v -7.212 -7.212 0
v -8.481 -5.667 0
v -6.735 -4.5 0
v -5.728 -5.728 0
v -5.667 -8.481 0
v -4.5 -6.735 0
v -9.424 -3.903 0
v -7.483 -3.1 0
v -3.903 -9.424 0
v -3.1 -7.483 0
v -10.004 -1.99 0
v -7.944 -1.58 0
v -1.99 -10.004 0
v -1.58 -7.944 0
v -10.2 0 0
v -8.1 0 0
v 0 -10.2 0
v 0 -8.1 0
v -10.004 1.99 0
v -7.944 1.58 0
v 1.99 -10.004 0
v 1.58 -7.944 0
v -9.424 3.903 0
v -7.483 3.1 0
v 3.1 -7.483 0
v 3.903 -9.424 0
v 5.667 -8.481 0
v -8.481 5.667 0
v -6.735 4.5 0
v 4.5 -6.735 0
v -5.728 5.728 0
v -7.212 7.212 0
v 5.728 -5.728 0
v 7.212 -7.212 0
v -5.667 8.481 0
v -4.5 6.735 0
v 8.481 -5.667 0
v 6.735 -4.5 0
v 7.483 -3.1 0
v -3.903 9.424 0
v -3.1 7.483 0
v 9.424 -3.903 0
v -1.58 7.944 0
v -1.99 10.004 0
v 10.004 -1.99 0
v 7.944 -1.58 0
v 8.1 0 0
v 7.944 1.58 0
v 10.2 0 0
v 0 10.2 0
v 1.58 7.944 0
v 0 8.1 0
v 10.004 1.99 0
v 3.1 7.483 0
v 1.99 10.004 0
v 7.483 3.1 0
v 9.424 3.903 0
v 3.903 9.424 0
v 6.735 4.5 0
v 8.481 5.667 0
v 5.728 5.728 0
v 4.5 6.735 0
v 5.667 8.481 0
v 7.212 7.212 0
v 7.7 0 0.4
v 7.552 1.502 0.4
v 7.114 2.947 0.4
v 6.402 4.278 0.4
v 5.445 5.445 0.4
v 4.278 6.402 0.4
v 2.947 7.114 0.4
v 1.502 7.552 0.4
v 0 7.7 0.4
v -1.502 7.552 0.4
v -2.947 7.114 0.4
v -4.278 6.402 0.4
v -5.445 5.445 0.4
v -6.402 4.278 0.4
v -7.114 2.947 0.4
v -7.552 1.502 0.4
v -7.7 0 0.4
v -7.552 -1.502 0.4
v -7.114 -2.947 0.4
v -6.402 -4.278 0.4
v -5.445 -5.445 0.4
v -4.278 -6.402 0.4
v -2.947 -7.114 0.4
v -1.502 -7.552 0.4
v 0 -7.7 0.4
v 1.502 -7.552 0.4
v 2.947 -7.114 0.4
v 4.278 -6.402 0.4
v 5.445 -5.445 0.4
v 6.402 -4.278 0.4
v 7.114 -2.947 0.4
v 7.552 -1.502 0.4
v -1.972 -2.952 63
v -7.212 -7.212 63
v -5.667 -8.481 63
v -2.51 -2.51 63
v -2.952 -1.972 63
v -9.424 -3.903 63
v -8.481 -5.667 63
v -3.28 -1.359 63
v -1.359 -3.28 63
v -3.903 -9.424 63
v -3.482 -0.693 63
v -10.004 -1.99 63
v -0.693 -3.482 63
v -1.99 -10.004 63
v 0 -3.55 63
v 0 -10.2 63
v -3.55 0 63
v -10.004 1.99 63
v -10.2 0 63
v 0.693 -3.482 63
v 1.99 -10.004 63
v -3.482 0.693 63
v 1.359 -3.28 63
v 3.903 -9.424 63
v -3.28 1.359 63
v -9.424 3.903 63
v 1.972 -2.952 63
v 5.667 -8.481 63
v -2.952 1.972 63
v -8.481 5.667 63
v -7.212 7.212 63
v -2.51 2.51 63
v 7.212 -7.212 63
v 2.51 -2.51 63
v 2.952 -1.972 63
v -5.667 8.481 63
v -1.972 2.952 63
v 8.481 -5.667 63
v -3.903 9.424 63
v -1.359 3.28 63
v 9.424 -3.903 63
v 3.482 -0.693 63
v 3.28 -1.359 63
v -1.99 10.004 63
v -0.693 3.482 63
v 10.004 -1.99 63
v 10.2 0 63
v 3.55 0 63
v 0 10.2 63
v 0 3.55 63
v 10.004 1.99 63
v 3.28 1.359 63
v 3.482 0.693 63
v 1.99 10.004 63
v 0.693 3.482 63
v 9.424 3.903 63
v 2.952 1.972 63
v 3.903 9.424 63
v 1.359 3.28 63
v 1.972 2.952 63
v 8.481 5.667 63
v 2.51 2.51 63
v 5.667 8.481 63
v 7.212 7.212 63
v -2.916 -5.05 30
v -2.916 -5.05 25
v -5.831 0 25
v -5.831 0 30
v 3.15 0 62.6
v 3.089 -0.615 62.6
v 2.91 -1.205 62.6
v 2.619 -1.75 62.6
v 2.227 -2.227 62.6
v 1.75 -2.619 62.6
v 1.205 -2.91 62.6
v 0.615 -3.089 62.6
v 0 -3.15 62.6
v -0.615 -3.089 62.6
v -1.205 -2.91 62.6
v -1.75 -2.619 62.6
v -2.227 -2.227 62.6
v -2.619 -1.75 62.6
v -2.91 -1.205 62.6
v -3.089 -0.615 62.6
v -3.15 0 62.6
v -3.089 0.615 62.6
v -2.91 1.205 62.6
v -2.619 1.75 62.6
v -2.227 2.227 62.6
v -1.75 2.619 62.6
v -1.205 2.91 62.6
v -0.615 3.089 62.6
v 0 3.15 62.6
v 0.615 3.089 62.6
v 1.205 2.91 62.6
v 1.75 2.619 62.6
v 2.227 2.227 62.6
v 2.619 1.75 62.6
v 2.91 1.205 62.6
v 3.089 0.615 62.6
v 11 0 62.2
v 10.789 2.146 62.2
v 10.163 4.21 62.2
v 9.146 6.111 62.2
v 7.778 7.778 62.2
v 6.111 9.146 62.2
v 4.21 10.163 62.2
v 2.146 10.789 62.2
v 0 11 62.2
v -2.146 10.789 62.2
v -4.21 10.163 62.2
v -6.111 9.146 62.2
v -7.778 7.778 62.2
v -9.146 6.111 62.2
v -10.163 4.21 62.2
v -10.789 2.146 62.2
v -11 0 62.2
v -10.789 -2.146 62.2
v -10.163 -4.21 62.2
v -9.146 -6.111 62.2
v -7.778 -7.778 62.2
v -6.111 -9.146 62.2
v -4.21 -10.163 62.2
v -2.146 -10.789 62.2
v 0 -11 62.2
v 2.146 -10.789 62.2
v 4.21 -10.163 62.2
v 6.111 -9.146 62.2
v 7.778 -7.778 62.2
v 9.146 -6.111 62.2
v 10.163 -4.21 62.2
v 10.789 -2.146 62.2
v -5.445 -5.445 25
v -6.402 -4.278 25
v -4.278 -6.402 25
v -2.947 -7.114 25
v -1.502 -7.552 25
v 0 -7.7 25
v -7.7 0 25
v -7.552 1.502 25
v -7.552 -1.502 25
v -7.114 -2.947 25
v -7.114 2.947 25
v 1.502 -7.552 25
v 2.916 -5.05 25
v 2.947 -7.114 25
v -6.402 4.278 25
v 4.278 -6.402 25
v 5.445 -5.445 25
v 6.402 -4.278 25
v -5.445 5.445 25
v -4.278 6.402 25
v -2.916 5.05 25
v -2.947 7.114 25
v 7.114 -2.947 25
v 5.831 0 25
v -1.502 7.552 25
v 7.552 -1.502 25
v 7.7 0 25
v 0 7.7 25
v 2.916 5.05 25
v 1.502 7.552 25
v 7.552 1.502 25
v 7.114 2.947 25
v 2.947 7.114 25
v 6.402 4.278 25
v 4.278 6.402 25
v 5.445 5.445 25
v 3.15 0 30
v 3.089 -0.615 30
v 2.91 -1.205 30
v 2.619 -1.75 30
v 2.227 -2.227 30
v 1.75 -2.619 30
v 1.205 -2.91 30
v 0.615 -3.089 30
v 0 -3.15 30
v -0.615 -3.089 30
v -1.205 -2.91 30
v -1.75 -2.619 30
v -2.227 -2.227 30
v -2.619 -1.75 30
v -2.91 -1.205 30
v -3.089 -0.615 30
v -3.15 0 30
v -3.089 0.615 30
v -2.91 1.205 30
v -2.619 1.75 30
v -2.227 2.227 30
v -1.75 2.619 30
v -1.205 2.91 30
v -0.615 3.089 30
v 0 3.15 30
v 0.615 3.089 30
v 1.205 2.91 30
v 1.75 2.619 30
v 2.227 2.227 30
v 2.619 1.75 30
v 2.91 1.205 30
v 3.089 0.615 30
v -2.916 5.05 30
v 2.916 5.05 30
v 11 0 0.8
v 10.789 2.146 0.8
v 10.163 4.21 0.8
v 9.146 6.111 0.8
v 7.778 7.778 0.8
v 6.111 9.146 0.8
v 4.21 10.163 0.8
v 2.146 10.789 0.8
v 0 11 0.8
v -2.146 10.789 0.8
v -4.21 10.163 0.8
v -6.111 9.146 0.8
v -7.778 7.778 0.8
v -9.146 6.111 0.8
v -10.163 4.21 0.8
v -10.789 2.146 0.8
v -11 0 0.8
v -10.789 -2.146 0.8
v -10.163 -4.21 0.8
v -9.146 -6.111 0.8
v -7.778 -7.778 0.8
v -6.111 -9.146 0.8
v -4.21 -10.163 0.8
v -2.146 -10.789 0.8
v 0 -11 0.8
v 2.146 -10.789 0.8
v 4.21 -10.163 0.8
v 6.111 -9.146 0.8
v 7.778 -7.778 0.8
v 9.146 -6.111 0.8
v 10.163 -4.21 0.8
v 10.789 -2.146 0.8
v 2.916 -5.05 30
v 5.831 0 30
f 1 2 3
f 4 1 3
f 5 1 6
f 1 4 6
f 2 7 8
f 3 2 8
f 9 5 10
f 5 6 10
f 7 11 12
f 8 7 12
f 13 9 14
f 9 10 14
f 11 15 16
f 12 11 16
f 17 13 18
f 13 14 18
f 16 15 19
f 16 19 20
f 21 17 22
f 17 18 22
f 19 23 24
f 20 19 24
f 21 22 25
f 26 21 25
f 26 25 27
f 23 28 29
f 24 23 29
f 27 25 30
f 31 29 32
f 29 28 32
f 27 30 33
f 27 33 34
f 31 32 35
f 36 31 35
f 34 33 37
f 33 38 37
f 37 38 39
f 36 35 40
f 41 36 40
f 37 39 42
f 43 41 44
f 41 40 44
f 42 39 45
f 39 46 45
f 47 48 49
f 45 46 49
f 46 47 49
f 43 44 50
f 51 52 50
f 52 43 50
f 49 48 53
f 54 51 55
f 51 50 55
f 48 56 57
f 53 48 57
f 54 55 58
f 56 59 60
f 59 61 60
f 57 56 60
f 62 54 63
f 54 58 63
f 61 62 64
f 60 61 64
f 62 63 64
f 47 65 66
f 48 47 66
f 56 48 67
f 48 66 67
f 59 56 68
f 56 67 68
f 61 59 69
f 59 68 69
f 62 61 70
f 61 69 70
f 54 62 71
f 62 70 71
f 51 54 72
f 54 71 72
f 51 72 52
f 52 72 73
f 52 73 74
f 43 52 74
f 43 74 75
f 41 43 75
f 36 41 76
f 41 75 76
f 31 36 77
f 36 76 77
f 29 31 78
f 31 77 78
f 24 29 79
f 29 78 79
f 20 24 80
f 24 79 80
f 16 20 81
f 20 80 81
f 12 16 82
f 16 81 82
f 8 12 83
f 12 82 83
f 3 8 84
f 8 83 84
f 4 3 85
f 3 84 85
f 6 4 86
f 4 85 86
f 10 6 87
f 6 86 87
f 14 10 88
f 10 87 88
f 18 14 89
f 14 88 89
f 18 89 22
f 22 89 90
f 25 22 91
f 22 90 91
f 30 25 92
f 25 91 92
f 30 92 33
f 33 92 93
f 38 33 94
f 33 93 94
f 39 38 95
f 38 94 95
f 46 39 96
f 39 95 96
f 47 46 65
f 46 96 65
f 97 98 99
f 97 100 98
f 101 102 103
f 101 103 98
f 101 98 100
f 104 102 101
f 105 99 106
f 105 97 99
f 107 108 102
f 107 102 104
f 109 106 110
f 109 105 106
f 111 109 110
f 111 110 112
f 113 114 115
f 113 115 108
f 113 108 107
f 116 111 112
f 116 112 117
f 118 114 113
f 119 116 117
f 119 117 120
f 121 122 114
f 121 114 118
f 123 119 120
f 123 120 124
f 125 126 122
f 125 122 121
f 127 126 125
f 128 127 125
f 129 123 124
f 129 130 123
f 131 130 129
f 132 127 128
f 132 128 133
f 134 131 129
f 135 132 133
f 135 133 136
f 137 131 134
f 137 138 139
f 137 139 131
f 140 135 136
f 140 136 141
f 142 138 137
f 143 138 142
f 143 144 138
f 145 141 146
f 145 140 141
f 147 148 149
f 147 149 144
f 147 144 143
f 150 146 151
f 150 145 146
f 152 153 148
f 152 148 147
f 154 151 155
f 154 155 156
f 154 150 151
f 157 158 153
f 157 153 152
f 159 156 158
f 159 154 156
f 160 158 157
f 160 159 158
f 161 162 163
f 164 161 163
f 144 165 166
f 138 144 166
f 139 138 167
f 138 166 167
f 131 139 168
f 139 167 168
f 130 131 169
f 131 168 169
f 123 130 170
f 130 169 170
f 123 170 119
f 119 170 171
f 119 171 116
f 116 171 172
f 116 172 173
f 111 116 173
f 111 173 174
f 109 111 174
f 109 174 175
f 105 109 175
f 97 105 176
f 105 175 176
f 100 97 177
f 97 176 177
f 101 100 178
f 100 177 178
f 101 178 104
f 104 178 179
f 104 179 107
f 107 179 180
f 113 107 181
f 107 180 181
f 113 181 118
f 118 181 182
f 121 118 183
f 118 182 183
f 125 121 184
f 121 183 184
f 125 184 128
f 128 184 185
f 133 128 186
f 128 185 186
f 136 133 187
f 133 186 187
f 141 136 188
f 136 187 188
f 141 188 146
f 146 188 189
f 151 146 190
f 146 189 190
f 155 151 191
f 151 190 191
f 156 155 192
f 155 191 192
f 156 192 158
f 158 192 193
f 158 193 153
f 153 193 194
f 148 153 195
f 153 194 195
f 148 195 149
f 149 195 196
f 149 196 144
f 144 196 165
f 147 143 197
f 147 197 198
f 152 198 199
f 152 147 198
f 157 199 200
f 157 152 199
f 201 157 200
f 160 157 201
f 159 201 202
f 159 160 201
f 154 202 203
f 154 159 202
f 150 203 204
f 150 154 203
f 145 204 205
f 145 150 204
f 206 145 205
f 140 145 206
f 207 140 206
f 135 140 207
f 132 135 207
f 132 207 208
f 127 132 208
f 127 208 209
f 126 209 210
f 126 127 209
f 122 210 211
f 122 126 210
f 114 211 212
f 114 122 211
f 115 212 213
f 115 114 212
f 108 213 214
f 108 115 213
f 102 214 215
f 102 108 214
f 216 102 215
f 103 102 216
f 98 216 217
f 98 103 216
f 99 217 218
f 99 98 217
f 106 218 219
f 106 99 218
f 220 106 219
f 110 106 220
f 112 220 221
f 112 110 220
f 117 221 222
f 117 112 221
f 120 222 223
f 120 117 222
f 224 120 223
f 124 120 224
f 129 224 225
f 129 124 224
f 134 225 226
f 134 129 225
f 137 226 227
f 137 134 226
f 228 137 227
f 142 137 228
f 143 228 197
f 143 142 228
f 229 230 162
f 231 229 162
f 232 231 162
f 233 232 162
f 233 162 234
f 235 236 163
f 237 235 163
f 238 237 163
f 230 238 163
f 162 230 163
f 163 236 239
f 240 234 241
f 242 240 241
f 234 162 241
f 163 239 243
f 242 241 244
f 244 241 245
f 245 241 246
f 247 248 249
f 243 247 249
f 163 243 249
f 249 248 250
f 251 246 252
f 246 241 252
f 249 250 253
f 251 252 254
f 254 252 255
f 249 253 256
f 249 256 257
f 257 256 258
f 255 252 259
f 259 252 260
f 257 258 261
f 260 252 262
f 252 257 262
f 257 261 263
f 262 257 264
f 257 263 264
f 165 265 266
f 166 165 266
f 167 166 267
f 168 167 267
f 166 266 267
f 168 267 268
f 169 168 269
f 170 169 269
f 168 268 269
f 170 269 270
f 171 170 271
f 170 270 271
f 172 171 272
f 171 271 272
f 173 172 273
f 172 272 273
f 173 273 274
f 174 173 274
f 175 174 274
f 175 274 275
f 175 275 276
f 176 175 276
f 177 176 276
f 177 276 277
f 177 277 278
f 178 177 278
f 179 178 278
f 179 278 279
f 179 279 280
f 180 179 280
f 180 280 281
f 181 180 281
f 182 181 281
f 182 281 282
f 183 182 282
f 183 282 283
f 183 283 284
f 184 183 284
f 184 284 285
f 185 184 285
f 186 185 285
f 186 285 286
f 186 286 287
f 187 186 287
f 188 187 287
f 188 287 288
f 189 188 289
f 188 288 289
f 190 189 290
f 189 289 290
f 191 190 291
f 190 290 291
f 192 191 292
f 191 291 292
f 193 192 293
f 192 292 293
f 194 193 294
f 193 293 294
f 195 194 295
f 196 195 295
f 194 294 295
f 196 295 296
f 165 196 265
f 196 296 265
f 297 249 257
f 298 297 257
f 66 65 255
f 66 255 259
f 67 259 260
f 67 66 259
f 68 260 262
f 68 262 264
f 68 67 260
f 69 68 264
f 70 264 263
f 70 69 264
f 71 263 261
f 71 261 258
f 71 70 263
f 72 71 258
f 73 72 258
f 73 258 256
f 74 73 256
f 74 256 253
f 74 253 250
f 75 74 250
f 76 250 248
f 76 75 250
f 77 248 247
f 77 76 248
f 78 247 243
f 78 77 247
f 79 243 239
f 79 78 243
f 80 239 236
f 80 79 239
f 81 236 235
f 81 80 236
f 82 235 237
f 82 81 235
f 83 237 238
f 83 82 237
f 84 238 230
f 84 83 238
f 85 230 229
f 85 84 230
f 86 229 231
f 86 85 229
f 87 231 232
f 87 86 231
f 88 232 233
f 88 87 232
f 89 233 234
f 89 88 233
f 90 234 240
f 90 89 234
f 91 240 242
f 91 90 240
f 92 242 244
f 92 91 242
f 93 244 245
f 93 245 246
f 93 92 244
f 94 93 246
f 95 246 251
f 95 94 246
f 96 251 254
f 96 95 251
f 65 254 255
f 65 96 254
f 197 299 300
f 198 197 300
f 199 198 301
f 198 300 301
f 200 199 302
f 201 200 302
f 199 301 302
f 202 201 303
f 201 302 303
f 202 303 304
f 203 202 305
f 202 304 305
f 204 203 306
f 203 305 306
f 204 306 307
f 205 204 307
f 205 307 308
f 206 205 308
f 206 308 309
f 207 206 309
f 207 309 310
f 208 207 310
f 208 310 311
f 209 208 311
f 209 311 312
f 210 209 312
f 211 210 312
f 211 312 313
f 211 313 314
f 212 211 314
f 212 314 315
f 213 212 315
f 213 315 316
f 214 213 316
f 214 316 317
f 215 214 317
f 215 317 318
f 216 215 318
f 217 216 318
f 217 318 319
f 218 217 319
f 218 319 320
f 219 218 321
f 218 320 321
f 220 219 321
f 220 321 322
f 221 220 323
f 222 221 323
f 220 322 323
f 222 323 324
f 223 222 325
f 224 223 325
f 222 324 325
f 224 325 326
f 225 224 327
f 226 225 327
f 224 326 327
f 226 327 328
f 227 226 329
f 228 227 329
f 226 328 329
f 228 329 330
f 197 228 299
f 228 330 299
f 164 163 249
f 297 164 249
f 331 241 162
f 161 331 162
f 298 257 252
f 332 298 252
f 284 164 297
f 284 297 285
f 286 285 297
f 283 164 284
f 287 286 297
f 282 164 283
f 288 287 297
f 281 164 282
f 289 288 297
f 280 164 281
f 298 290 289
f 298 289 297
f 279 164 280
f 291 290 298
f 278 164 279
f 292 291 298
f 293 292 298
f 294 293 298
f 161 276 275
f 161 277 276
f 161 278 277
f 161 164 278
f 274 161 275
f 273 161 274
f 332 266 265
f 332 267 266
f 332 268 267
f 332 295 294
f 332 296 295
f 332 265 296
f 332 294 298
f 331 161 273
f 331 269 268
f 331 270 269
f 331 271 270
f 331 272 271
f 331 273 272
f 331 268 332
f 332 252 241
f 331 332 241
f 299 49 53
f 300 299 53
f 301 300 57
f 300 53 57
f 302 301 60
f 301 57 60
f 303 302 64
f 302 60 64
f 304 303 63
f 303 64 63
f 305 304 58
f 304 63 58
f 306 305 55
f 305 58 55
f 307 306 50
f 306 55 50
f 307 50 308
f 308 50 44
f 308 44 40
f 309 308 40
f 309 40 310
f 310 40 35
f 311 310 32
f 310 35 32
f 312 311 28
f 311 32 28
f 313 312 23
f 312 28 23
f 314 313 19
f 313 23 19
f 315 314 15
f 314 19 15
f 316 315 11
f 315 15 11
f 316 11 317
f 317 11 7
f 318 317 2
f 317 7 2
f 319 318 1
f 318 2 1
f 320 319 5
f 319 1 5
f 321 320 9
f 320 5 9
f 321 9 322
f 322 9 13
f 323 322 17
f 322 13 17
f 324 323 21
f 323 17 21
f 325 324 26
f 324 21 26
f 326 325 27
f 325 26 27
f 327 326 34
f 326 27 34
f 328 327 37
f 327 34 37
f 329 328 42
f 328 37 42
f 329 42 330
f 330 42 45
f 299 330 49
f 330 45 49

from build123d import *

# Parameters (mm, degrees)
F0_R     = 11
F0_R_2   = 7.7
F1_DEPTH = 25
F2_R     = 11
F3_DEPTH = 38
F5_DEPTH = 5
F6_R     = 3.15
F7_DEPTH = 50
F8_SIZE  = 0.8
F9_SIZE  = 0.4
F10_SIZE = 0.4


with BuildPart() as f1:
    # F0 (on Top) → F1 (new body)
    with BuildSketch(Plane.XY):
        Circle(F0_R)
        Circle(F0_R_2, mode=Mode.SUBTRACT)
    extrude(amount=F1_DEPTH)

    # F2 (on face) → F3 (join)
    with BuildSketch(Plane.XY.offset(25)):
        Circle(F2_R)
    extrude(amount=F3_DEPTH)

    # F4 (on face) → F5 (cut)
    with BuildSketch(Plane(origin=(0, 0, 25), x_dir=(1, 0, 0), z_dir=(0, 0, -1))):
        Polygon((-2.915619, -5.05), (2.915619, -5.05), (5.831238, 0), (2.915619, 5.05), (-2.915619, 5.05), (-5.831238, 0), align=None)
    extrude(amount=-F5_DEPTH, mode=Mode.SUBTRACT)

    # F6 (on face) → F7 (cut)
    with BuildSketch(Plane(origin=(0, 0, 30), x_dir=(1, 0, 0), z_dir=(0, 0, -1))):
        Circle(F6_R)
    extrude(amount=-F7_DEPTH, mode=Mode.SUBTRACT)

    # F8
    f8_edges = [f1.edges().sort_by_distance(p)[0] for p in [
        (-11, 0, 0),
        (-11, 0, 63),
    ]]
    chamfer(f8_edges, length=F8_SIZE)

    # F9
    f9_edges = [f1.edges().sort_by_distance(p)[0] for p in [
        (-3.15, 0, 63),
    ]]
    chamfer(f9_edges, length=F9_SIZE)

    # F10
    f10_edges = [f1.edges().sort_by_distance(p)[0] for p in [
        (-7.7, 0, 0),
    ]]
    chamfer(f10_edges, length=F10_SIZE)


solid = f1.part
